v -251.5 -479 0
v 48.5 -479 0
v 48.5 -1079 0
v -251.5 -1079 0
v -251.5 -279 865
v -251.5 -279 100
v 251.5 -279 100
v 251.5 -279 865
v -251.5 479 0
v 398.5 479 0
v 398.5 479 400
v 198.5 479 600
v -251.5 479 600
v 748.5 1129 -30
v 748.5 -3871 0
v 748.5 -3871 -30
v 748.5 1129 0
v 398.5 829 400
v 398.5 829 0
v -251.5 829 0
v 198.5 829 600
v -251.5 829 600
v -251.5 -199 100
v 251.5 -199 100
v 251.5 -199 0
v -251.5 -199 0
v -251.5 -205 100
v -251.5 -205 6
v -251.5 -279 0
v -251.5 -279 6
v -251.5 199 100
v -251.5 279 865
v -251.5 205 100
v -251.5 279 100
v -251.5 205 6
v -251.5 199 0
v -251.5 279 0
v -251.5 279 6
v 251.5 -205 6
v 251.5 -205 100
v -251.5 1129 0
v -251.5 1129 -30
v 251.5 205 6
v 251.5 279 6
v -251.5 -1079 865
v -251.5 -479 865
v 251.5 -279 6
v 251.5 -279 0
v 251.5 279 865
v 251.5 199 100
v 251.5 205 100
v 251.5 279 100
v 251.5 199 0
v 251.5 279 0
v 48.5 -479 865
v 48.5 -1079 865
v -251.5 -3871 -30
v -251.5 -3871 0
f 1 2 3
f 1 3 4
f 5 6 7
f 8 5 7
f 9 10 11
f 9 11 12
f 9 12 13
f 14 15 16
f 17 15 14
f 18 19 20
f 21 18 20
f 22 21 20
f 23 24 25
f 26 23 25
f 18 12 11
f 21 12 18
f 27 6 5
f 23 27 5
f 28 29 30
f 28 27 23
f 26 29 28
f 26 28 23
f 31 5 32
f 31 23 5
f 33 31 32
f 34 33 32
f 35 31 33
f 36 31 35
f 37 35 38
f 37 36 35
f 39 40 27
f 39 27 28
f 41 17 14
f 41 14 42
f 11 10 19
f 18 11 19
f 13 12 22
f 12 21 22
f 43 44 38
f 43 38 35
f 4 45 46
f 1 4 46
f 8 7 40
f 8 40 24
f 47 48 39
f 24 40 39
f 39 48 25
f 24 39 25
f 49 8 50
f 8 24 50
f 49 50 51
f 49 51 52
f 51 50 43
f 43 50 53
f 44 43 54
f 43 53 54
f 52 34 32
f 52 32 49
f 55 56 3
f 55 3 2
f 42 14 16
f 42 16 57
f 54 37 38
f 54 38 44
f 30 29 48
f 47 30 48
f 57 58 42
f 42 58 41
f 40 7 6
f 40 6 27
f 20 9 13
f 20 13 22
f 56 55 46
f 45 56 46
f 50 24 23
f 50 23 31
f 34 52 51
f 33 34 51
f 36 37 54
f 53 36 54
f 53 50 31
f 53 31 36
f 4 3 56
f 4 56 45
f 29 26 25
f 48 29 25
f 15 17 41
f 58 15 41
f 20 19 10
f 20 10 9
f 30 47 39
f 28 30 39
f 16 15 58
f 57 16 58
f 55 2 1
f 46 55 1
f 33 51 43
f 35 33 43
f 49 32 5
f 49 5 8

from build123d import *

# Parameters (mm, degrees)
SKETCH_1_W          = 503
SKETCH_1_H          = 558
EXTRUDE_1_DEPTH     = 865
SKETCH_2_W          = 200
SKETCH_2_H          = 398
CUT_EXTRUDE_1_DEPTH = 1039.785348376
SKETCH_3_W          = 94
SKETCH_3_H          = 148
CUT_EXTRUDE_2_DEPTH = 1039.785348376
SKETCH_4_W          = 300
SKETCH_4_H          = 600
EXTRUDE_2_DEPTH     = 865
SKETCH_5_W          = 650
SKETCH_5_H          = 350
EXTRUDE_3_DEPTH     = 600
CHAMFER_1_SIZE      = 200
SKETCH_6_W          = 1000
SKETCH_6_H          = 5000
EXTRUDE_4_DEPTH     = 30


with BuildPart() as part:
    # 草图1 → 凸台-拉伸1 (new body)
    with BuildSketch(Plane.XY):
        Rectangle(SKETCH_1_W, SKETCH_1_H)
    extrude(amount=EXTRUDE_1_DEPTH)

    # 草图2 → 切除-拉伸1 (cut, through all)
    with BuildSketch(Plane(origin=(251.5, 0, 0), x_dir=(0, 0, -1), z_dir=(1, 0, 0))):
        Rectangle(SKETCH_2_W, SKETCH_2_H)
    extrude(amount=-CUT_EXTRUDE_1_DEPTH, mode=Mode.SUBTRACT)

    # 草图3 → 切除-拉伸2 (cut, through all)
    with BuildSketch(Plane(origin=(251.5, 0, 0), x_dir=(0, 0, -1), z_dir=(1, 0, 0))):
        with Locations((-53, -279)):
            Rectangle(SKETCH_3_W, SKETCH_3_H)
    cut_extrude_2 = extrude(amount=-CUT_EXTRUDE_2_DEPTH, mode=Mode.SUBTRACT)

    # 镜向1: 切除-拉伸2 across plane
    add(cut_extrude_2.mirror(Plane.ZX), mode=Mode.SUBTRACT)


with BuildPart() as body_2:
    # 草图4 → 凸台-拉伸2 (new body)
    with BuildSketch(Plane(origin=(0, 0, 0), x_dir=(-1, 0, 0), z_dir=(0, 0, -1))):
        with Locations((101.5, -779)):
            Rectangle(SKETCH_4_W, SKETCH_4_H)
    extrude(amount=-EXTRUDE_2_DEPTH)


with BuildPart() as body_3:
    # 草图5 → 凸台-拉伸3 (new body)
    with BuildSketch(Plane(origin=(0, 0, 0), x_dir=(-1, 0, 0), z_dir=(0, 0, -1))):
        with Locations((-73.5, 654)):
            Rectangle(SKETCH_5_W, SKETCH_5_H)
    extrude(amount=-EXTRUDE_3_DEPTH)

    # 倒角1
    chamfer_1_edges = [body_3.edges().sort_by_distance(p)[0] for p in [
        (398.5, 654, 600),
    ]]
    chamfer(chamfer_1_edges, length=CHAMFER_1_SIZE)


with BuildPart() as body_4:
    # 草图6 → 凸台-拉伸4 (new body)
    with BuildSketch(Plane(origin=(0, 0, 0), x_dir=(-1, 0, 0), z_dir=(0, 0, -1))):
        with Locations((-248.5, -1371)):
            Rectangle(SKETCH_6_W, SKETCH_6_H)
    extrude(amount=EXTRUDE_4_DEPTH)


solid = Compound([part.part, body_2.part, body_3.part, body_4.part])
